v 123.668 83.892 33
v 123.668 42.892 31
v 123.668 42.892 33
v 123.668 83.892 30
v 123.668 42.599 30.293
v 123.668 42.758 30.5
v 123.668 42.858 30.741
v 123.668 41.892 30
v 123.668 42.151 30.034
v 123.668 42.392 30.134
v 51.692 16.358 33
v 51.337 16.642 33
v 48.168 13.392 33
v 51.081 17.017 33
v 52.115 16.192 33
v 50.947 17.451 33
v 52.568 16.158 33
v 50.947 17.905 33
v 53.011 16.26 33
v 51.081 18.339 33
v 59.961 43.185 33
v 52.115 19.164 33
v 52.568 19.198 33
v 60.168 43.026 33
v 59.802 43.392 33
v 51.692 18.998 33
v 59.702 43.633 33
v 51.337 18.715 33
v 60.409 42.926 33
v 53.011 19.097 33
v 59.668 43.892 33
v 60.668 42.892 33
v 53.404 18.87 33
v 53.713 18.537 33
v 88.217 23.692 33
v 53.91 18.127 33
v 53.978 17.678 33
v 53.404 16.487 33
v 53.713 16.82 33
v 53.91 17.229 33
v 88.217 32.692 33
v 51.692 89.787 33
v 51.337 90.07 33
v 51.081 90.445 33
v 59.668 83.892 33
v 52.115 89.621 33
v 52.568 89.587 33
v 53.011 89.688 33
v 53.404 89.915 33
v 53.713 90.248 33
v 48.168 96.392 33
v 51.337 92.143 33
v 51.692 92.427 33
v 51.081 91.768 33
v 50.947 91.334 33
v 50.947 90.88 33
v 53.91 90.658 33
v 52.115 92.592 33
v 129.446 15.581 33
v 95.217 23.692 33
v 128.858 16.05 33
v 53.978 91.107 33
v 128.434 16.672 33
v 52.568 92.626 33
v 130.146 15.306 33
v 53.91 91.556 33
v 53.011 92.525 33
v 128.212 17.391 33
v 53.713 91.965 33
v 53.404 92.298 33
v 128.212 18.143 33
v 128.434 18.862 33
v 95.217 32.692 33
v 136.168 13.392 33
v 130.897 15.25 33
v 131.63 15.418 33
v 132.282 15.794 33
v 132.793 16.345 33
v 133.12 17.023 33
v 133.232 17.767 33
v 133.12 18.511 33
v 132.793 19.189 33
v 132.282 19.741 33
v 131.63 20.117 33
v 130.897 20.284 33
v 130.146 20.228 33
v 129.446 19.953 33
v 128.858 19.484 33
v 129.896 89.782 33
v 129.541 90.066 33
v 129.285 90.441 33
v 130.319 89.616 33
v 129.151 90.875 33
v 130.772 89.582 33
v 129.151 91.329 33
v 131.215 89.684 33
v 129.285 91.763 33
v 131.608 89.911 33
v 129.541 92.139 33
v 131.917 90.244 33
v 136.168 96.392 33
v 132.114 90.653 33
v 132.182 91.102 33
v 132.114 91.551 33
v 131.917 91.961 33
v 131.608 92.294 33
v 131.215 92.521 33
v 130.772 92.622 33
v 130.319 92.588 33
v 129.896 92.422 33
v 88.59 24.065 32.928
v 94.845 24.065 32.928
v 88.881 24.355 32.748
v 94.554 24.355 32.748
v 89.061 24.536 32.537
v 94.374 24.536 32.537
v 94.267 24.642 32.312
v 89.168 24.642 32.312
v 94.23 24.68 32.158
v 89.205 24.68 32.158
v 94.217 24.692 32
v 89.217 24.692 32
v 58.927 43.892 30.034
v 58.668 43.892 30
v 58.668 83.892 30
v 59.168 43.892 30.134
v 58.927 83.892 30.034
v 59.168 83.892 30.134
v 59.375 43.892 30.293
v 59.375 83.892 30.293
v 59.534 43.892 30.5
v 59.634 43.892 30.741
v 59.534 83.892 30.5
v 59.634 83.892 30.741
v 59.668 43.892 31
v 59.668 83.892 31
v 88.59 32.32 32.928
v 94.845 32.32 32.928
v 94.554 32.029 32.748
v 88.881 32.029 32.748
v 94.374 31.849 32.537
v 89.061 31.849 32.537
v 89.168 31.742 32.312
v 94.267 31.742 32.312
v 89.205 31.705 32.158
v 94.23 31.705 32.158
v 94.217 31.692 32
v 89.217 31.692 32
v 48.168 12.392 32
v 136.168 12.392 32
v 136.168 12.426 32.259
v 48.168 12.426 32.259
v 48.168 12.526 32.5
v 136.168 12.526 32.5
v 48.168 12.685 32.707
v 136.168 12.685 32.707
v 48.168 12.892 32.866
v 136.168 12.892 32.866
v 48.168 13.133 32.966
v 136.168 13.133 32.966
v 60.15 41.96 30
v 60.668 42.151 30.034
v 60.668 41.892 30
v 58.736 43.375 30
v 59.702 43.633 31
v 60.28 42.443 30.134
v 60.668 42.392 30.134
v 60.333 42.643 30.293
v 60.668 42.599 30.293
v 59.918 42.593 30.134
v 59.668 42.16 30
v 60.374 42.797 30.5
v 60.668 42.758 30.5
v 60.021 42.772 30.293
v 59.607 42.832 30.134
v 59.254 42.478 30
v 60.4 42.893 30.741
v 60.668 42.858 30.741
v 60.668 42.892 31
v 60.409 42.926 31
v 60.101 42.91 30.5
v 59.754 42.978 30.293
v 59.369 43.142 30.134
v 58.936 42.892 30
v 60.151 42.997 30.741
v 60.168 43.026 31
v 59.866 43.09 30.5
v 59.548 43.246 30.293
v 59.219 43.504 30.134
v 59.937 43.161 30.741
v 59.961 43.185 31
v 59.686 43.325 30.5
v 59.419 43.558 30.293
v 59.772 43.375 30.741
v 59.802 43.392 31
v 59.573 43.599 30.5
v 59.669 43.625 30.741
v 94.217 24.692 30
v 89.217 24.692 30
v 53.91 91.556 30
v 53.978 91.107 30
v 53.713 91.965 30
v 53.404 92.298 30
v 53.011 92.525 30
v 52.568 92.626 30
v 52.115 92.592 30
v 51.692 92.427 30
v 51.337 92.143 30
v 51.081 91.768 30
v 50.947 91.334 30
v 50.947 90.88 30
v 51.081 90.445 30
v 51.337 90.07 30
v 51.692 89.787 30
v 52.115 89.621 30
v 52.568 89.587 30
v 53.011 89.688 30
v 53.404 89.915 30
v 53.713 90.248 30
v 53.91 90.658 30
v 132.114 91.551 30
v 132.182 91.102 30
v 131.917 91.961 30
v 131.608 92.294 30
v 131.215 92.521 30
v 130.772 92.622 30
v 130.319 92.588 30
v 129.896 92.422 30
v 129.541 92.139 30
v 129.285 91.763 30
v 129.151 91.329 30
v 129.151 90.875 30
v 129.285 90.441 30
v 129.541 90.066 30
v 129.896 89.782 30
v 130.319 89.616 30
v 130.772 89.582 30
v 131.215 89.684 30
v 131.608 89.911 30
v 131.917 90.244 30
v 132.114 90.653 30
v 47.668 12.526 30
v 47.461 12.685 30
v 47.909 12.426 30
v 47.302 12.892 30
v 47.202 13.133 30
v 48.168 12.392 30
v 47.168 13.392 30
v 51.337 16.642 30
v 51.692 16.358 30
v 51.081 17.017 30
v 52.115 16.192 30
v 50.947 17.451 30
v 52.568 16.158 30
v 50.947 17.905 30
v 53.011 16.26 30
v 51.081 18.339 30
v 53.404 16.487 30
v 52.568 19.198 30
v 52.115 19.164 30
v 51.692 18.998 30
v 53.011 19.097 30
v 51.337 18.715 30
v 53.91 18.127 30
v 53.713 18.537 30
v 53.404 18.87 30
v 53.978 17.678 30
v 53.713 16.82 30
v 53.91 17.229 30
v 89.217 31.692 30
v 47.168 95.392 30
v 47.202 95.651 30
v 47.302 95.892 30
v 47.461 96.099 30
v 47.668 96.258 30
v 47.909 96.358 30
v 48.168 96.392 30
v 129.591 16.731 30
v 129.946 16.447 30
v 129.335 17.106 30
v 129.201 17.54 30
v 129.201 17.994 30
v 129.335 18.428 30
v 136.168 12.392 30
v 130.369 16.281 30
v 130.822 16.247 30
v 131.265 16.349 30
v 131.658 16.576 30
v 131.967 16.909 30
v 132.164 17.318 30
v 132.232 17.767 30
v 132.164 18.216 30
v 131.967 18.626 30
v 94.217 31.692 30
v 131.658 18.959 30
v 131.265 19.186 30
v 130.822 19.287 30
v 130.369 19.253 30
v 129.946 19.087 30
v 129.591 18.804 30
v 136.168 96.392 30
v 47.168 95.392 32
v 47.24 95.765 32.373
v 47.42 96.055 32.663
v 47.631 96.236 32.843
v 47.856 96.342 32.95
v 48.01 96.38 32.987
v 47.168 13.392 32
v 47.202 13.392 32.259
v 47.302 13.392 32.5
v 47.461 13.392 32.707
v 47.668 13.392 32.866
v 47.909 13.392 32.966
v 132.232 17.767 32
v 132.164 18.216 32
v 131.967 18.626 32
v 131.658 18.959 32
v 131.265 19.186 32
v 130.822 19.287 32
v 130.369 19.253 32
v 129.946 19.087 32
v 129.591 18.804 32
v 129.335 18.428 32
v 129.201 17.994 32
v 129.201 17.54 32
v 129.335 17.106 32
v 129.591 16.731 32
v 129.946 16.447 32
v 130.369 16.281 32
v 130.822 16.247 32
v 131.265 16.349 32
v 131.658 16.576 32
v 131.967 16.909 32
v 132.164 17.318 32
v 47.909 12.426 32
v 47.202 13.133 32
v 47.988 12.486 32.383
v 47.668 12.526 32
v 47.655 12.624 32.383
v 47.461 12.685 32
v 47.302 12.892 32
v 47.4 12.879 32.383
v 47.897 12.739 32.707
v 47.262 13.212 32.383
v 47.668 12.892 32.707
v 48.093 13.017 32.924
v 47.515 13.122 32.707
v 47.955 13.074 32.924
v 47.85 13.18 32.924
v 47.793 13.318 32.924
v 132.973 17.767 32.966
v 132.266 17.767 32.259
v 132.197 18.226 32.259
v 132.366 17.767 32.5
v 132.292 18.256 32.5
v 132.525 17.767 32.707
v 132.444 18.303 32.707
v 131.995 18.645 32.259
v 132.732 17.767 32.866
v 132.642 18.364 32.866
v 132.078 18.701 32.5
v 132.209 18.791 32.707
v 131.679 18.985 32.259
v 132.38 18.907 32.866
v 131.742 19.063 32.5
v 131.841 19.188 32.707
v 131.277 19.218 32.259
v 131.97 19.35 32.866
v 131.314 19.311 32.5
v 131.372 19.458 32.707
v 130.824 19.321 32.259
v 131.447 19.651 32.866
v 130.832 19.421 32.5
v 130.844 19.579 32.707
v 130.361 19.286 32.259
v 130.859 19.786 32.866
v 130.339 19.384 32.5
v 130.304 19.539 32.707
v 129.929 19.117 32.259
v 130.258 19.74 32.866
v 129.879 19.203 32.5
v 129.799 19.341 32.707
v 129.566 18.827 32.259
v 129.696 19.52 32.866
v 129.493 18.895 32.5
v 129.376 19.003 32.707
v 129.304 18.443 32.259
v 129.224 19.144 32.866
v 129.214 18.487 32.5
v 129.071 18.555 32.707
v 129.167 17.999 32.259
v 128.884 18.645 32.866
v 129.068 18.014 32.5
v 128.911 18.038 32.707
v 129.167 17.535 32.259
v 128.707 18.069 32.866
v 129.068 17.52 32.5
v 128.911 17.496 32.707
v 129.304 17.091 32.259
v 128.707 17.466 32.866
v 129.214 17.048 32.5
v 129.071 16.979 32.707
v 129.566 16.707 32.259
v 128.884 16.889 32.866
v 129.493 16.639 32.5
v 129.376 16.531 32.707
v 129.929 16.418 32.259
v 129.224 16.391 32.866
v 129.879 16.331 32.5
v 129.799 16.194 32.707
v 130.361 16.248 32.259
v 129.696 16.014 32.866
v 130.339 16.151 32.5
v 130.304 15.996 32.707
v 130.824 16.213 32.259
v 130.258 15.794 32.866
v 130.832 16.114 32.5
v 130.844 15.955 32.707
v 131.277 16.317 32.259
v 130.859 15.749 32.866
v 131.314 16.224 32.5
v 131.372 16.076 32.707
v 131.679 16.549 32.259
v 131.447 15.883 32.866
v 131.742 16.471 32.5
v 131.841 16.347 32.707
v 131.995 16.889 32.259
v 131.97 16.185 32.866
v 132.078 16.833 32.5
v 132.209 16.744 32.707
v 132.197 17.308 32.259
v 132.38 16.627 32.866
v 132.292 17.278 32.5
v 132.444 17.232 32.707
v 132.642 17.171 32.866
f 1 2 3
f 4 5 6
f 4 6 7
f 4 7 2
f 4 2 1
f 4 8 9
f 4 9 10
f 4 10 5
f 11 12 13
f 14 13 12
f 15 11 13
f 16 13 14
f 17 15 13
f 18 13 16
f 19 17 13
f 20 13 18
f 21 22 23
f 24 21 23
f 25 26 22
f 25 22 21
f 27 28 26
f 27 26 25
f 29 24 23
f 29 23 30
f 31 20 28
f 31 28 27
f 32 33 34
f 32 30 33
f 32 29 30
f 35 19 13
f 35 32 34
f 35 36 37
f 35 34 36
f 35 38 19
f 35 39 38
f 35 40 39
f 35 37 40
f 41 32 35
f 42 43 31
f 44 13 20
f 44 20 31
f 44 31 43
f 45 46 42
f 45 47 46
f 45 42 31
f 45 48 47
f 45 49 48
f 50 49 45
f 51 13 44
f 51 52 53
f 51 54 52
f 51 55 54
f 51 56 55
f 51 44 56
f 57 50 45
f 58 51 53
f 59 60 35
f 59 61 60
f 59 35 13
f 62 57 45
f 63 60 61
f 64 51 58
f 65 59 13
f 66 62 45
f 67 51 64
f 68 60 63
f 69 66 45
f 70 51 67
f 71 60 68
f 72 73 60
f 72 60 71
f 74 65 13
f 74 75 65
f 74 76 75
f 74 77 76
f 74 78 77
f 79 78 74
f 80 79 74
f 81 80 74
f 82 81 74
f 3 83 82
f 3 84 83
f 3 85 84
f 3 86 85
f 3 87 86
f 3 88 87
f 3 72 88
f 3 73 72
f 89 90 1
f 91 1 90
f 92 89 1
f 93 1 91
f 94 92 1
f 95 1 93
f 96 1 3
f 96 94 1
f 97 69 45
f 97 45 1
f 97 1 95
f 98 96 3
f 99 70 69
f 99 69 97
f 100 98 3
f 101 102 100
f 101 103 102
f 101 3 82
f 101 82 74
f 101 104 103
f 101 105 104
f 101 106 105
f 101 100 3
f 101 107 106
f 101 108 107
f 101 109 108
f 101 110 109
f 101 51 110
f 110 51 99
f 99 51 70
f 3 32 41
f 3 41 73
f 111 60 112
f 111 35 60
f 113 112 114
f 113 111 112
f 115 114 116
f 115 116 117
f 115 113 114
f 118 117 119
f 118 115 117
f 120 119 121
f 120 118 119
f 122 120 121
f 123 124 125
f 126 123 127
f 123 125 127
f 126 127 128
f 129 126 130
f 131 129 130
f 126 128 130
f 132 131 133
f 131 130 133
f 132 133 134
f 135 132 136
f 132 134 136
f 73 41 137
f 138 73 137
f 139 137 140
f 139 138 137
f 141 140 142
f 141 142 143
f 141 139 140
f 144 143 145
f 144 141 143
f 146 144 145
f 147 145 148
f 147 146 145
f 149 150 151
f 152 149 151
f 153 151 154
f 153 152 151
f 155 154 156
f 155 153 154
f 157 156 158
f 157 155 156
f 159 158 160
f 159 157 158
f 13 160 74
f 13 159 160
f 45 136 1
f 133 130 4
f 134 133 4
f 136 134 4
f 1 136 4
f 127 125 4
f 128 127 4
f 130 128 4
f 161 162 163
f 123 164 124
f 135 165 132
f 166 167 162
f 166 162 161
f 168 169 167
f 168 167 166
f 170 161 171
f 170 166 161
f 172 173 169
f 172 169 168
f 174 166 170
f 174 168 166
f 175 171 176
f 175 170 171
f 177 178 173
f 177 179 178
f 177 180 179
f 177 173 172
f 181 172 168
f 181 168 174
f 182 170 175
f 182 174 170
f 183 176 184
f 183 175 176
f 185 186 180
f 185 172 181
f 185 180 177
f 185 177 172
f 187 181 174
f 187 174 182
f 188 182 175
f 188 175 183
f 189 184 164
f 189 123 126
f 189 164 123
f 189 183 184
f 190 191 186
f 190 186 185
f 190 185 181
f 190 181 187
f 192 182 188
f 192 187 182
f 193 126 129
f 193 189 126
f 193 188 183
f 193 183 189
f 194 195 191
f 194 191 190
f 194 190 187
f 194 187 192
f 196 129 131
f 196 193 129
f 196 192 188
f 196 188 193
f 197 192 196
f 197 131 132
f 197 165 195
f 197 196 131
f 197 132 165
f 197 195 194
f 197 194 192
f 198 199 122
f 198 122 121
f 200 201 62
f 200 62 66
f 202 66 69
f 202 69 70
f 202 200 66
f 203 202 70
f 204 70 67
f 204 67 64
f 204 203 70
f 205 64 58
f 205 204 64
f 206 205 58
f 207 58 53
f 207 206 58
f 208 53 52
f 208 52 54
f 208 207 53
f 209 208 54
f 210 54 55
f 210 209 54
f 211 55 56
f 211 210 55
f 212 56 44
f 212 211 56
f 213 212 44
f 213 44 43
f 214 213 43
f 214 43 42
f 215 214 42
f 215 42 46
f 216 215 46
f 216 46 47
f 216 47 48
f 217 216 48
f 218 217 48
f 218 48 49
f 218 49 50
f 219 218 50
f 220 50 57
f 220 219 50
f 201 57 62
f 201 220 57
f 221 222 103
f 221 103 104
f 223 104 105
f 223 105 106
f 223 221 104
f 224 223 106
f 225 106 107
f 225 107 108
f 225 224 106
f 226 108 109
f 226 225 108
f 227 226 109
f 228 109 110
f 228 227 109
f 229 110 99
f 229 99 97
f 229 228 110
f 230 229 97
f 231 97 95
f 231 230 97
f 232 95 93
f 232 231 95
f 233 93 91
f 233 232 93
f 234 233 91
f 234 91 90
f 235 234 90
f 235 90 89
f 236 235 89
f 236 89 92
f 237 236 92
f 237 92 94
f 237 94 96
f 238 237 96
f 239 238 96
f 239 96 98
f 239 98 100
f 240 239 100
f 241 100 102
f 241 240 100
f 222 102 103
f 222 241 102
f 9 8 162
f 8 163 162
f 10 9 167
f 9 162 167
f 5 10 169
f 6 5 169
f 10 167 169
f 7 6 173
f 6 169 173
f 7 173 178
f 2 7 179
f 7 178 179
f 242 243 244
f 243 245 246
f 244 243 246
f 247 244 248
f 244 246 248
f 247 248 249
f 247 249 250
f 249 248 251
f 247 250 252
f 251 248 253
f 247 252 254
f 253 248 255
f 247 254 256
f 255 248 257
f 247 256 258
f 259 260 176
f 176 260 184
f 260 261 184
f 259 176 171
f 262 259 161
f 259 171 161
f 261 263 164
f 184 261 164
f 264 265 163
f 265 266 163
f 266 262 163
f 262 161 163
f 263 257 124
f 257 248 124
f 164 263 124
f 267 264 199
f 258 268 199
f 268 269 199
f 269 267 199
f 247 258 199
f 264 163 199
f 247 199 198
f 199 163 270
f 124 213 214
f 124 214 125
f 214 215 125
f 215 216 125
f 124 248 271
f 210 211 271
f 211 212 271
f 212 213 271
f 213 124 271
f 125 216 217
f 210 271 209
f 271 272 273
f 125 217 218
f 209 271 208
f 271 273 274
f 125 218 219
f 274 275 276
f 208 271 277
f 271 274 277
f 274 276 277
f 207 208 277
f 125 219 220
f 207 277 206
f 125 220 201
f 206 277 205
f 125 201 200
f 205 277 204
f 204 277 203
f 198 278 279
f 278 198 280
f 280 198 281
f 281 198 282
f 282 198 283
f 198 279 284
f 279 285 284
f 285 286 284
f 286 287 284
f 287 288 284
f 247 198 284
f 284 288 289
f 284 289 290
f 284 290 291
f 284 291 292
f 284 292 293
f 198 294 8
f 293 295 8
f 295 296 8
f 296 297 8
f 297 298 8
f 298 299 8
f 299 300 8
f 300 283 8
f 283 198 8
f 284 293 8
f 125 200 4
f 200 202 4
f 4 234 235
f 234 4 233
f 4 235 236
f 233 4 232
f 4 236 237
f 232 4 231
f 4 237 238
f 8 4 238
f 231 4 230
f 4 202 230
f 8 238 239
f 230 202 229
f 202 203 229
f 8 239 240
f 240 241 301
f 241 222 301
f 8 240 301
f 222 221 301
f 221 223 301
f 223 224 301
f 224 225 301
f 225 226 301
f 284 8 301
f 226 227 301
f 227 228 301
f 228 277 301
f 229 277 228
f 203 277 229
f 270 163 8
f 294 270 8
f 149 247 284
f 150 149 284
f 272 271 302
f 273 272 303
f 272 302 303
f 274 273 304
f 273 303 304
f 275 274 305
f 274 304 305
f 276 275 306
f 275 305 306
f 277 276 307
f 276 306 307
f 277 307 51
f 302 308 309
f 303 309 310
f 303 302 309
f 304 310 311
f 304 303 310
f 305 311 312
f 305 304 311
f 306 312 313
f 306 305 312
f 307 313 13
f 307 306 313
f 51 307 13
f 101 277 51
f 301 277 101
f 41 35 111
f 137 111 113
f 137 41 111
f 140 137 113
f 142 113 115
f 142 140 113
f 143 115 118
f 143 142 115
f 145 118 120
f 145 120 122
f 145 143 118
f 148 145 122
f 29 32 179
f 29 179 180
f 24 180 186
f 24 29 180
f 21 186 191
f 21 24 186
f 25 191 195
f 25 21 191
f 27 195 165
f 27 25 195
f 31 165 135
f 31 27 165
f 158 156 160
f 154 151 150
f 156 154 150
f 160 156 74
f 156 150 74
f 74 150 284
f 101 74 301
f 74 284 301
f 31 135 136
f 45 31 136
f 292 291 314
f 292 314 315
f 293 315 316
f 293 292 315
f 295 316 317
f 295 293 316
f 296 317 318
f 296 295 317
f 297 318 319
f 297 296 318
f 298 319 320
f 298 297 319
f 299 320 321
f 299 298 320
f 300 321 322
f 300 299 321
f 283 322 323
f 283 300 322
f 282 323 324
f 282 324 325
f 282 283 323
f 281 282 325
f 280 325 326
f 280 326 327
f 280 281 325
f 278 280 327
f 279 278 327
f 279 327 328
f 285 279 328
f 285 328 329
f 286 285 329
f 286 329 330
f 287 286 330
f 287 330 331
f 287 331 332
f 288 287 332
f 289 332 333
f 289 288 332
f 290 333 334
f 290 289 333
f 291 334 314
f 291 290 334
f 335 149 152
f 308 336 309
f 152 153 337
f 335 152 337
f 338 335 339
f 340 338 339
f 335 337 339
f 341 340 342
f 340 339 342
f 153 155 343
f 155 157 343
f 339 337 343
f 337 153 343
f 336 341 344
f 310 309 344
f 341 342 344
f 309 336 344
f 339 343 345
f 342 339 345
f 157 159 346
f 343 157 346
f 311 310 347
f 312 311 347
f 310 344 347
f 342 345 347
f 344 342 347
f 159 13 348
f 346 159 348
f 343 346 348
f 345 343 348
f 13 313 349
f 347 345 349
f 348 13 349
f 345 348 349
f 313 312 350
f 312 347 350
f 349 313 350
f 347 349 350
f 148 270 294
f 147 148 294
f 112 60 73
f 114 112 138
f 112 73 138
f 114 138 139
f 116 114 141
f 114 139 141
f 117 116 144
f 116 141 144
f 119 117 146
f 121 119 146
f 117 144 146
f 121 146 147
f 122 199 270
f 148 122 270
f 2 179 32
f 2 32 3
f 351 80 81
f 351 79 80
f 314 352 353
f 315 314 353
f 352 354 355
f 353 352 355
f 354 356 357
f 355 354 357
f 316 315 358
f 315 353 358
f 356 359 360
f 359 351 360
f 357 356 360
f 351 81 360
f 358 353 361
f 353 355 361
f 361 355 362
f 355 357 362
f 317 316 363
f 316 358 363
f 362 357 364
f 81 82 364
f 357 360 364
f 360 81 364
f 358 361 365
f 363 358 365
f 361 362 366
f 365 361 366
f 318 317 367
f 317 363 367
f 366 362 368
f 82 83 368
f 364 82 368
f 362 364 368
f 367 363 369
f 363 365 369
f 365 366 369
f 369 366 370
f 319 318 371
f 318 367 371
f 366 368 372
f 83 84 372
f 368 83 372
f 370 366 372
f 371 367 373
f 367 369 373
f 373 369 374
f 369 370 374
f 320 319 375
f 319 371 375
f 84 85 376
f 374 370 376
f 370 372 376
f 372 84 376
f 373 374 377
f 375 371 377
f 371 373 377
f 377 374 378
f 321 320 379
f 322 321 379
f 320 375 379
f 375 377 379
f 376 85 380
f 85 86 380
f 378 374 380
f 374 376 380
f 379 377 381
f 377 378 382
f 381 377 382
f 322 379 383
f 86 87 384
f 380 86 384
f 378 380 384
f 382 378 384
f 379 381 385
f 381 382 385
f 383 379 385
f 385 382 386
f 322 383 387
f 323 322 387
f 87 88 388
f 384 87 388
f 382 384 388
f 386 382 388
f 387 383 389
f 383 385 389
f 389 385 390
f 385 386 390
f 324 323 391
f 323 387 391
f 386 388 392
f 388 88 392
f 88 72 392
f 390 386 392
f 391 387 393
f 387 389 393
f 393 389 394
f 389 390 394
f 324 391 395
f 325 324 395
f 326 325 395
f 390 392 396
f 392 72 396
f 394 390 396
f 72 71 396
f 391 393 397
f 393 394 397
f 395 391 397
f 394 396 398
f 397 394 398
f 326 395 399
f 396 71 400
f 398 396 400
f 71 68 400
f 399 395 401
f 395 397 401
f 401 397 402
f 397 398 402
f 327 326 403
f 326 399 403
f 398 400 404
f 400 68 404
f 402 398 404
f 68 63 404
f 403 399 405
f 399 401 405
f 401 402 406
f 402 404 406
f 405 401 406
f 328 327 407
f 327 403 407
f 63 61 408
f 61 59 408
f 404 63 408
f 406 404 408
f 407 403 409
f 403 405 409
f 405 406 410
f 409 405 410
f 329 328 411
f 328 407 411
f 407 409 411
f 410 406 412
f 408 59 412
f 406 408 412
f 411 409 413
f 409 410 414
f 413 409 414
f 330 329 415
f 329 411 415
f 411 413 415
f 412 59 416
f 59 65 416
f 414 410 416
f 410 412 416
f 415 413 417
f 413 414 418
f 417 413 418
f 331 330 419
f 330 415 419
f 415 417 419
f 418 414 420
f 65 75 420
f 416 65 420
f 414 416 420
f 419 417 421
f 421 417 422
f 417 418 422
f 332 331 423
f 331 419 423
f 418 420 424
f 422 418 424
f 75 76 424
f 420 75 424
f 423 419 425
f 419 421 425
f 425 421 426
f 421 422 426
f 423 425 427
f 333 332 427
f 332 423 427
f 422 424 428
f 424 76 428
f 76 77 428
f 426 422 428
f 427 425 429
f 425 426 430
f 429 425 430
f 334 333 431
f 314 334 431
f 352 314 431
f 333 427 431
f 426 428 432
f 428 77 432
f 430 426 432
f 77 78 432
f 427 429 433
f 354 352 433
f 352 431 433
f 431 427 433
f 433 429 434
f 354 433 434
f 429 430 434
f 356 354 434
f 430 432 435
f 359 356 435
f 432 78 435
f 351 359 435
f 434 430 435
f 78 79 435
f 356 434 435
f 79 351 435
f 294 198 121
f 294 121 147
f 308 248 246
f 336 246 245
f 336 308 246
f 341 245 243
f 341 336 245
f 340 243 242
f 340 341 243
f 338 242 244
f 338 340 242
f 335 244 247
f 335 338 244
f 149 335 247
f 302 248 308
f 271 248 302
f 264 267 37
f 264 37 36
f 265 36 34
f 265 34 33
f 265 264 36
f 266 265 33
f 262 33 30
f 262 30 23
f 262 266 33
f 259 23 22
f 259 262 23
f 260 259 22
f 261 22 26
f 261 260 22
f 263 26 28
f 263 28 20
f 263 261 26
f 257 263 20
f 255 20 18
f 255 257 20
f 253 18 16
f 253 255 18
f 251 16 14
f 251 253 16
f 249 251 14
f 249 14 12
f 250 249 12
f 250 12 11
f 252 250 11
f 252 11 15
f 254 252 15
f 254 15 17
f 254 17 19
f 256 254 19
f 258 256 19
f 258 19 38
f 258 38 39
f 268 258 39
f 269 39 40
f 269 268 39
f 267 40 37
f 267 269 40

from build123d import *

# Parameters (mm, degrees)
SKETCH006_W      = 89
SKETCH006_H      = 84
SKETCH006_R      = 1.524
SKETCH006_W_2    = 5
SKETCH006_H_2    = 7
SKETCH006_W_3    = 64
SKETCH006_H_3    = 41
EXTRUDE006_DEPTH = 3
FILLET008_R      = 1
FILLET009_R      = 1
FILLET010_R      = 1
FILLET012_R      = 1
FILLET013_R      = 1
FILLET014_R      = 1
FILLET015_R      = 1


with BuildPart() as part:
    # Sketch006 → Extrude006 (new body)
    with BuildSketch(Plane.XY):
        with Locations((91.667907, 54.392171)):
            Rectangle(SKETCH006_W, SKETCH006_H)
        with Locations((52.453907, 91.106708)):
            Circle(SKETCH006_R, mode=Mode.SUBTRACT)
        with Locations((130.657907, 91.102171)):
            Circle(SKETCH006_R, mode=Mode.SUBTRACT)
        with Locations((130.707907, 17.767171)):
            Circle(SKETCH006_R, mode=Mode.SUBTRACT)
        with Locations((52.453907, 17.678171)):
            Circle(SKETCH006_R, mode=Mode.SUBTRACT)
        with Locations((91.717396, 28.192171)):
            Rectangle(SKETCH006_W_2, SKETCH006_H_2, mode=Mode.SUBTRACT)
        with Locations((91.667907, 63.392171)):
            Rectangle(SKETCH006_W_3, SKETCH006_H_3, mode=Mode.SUBTRACT)
    extrude(amount=EXTRUDE006_DEPTH)


with BuildPart() as part_1:
    # Extrude006 placement: moved
    add(part.part.moved(Location((0, 0, 30))))

    # Fillet008
    fillet008_edges = [part_1.edges().sort_by_distance(p)[0] for p in [
        (47.167907, 12.392171, 31.5),
    ]]
    fillet(fillet008_edges, radius=FILLET008_R)

    # Fillet009
    fillet009_edges = [part_1.edges().sort_by_distance(p)[0] for p in [
        (59.667907, 42.892171, 31.5),
    ]]
    fillet(fillet009_edges, radius=FILLET009_R)

    # Fillet010
    fillet010_edges = [part_1.edges().sort_by_distance(p)[0] for p in [
        (47.167907, 96.392171, 31.5),
        (47.167907, 54.892171, 33),
    ]]
    fillet(fillet010_edges, radius=FILLET010_R)

    # Fillet012
    fillet012_edges = [part_1.edges().sort_by_distance(p)[0] for p in [
        (129.183907, 17.767171, 33),
    ]]
    fillet(fillet012_edges, radius=FILLET012_R)

    # Fillet013
    fillet013_edges = [part_1.edges().sort_by_distance(p)[0] for p in [
        (132.5248, 17.767171, 32.707107),
        (91.717396, 31.692171, 33),
        (94.217396, 28.192171, 33),
    ]]
    fillet(fillet013_edges, radius=FILLET013_R)

    # Fillet014
    fillet014_edges = [part_1.edges().sort_by_distance(p)[0] for p in [
        (59.667907, 63.892171, 30),
    ]]
    fillet(fillet014_edges, radius=FILLET014_R)

    # Fillet015
    fillet015_edges = [part_1.edges().sort_by_distance(p)[0] for p in [
        (95.217396, 28.692171, 33),
        (94.717396, 24.692171, 33),
        (91.717396, 24.692171, 33),
        (89.217396, 28.192171, 33),
    ]]
    fillet(fillet015_edges, radius=FILLET015_R)


solid = part_1.part
